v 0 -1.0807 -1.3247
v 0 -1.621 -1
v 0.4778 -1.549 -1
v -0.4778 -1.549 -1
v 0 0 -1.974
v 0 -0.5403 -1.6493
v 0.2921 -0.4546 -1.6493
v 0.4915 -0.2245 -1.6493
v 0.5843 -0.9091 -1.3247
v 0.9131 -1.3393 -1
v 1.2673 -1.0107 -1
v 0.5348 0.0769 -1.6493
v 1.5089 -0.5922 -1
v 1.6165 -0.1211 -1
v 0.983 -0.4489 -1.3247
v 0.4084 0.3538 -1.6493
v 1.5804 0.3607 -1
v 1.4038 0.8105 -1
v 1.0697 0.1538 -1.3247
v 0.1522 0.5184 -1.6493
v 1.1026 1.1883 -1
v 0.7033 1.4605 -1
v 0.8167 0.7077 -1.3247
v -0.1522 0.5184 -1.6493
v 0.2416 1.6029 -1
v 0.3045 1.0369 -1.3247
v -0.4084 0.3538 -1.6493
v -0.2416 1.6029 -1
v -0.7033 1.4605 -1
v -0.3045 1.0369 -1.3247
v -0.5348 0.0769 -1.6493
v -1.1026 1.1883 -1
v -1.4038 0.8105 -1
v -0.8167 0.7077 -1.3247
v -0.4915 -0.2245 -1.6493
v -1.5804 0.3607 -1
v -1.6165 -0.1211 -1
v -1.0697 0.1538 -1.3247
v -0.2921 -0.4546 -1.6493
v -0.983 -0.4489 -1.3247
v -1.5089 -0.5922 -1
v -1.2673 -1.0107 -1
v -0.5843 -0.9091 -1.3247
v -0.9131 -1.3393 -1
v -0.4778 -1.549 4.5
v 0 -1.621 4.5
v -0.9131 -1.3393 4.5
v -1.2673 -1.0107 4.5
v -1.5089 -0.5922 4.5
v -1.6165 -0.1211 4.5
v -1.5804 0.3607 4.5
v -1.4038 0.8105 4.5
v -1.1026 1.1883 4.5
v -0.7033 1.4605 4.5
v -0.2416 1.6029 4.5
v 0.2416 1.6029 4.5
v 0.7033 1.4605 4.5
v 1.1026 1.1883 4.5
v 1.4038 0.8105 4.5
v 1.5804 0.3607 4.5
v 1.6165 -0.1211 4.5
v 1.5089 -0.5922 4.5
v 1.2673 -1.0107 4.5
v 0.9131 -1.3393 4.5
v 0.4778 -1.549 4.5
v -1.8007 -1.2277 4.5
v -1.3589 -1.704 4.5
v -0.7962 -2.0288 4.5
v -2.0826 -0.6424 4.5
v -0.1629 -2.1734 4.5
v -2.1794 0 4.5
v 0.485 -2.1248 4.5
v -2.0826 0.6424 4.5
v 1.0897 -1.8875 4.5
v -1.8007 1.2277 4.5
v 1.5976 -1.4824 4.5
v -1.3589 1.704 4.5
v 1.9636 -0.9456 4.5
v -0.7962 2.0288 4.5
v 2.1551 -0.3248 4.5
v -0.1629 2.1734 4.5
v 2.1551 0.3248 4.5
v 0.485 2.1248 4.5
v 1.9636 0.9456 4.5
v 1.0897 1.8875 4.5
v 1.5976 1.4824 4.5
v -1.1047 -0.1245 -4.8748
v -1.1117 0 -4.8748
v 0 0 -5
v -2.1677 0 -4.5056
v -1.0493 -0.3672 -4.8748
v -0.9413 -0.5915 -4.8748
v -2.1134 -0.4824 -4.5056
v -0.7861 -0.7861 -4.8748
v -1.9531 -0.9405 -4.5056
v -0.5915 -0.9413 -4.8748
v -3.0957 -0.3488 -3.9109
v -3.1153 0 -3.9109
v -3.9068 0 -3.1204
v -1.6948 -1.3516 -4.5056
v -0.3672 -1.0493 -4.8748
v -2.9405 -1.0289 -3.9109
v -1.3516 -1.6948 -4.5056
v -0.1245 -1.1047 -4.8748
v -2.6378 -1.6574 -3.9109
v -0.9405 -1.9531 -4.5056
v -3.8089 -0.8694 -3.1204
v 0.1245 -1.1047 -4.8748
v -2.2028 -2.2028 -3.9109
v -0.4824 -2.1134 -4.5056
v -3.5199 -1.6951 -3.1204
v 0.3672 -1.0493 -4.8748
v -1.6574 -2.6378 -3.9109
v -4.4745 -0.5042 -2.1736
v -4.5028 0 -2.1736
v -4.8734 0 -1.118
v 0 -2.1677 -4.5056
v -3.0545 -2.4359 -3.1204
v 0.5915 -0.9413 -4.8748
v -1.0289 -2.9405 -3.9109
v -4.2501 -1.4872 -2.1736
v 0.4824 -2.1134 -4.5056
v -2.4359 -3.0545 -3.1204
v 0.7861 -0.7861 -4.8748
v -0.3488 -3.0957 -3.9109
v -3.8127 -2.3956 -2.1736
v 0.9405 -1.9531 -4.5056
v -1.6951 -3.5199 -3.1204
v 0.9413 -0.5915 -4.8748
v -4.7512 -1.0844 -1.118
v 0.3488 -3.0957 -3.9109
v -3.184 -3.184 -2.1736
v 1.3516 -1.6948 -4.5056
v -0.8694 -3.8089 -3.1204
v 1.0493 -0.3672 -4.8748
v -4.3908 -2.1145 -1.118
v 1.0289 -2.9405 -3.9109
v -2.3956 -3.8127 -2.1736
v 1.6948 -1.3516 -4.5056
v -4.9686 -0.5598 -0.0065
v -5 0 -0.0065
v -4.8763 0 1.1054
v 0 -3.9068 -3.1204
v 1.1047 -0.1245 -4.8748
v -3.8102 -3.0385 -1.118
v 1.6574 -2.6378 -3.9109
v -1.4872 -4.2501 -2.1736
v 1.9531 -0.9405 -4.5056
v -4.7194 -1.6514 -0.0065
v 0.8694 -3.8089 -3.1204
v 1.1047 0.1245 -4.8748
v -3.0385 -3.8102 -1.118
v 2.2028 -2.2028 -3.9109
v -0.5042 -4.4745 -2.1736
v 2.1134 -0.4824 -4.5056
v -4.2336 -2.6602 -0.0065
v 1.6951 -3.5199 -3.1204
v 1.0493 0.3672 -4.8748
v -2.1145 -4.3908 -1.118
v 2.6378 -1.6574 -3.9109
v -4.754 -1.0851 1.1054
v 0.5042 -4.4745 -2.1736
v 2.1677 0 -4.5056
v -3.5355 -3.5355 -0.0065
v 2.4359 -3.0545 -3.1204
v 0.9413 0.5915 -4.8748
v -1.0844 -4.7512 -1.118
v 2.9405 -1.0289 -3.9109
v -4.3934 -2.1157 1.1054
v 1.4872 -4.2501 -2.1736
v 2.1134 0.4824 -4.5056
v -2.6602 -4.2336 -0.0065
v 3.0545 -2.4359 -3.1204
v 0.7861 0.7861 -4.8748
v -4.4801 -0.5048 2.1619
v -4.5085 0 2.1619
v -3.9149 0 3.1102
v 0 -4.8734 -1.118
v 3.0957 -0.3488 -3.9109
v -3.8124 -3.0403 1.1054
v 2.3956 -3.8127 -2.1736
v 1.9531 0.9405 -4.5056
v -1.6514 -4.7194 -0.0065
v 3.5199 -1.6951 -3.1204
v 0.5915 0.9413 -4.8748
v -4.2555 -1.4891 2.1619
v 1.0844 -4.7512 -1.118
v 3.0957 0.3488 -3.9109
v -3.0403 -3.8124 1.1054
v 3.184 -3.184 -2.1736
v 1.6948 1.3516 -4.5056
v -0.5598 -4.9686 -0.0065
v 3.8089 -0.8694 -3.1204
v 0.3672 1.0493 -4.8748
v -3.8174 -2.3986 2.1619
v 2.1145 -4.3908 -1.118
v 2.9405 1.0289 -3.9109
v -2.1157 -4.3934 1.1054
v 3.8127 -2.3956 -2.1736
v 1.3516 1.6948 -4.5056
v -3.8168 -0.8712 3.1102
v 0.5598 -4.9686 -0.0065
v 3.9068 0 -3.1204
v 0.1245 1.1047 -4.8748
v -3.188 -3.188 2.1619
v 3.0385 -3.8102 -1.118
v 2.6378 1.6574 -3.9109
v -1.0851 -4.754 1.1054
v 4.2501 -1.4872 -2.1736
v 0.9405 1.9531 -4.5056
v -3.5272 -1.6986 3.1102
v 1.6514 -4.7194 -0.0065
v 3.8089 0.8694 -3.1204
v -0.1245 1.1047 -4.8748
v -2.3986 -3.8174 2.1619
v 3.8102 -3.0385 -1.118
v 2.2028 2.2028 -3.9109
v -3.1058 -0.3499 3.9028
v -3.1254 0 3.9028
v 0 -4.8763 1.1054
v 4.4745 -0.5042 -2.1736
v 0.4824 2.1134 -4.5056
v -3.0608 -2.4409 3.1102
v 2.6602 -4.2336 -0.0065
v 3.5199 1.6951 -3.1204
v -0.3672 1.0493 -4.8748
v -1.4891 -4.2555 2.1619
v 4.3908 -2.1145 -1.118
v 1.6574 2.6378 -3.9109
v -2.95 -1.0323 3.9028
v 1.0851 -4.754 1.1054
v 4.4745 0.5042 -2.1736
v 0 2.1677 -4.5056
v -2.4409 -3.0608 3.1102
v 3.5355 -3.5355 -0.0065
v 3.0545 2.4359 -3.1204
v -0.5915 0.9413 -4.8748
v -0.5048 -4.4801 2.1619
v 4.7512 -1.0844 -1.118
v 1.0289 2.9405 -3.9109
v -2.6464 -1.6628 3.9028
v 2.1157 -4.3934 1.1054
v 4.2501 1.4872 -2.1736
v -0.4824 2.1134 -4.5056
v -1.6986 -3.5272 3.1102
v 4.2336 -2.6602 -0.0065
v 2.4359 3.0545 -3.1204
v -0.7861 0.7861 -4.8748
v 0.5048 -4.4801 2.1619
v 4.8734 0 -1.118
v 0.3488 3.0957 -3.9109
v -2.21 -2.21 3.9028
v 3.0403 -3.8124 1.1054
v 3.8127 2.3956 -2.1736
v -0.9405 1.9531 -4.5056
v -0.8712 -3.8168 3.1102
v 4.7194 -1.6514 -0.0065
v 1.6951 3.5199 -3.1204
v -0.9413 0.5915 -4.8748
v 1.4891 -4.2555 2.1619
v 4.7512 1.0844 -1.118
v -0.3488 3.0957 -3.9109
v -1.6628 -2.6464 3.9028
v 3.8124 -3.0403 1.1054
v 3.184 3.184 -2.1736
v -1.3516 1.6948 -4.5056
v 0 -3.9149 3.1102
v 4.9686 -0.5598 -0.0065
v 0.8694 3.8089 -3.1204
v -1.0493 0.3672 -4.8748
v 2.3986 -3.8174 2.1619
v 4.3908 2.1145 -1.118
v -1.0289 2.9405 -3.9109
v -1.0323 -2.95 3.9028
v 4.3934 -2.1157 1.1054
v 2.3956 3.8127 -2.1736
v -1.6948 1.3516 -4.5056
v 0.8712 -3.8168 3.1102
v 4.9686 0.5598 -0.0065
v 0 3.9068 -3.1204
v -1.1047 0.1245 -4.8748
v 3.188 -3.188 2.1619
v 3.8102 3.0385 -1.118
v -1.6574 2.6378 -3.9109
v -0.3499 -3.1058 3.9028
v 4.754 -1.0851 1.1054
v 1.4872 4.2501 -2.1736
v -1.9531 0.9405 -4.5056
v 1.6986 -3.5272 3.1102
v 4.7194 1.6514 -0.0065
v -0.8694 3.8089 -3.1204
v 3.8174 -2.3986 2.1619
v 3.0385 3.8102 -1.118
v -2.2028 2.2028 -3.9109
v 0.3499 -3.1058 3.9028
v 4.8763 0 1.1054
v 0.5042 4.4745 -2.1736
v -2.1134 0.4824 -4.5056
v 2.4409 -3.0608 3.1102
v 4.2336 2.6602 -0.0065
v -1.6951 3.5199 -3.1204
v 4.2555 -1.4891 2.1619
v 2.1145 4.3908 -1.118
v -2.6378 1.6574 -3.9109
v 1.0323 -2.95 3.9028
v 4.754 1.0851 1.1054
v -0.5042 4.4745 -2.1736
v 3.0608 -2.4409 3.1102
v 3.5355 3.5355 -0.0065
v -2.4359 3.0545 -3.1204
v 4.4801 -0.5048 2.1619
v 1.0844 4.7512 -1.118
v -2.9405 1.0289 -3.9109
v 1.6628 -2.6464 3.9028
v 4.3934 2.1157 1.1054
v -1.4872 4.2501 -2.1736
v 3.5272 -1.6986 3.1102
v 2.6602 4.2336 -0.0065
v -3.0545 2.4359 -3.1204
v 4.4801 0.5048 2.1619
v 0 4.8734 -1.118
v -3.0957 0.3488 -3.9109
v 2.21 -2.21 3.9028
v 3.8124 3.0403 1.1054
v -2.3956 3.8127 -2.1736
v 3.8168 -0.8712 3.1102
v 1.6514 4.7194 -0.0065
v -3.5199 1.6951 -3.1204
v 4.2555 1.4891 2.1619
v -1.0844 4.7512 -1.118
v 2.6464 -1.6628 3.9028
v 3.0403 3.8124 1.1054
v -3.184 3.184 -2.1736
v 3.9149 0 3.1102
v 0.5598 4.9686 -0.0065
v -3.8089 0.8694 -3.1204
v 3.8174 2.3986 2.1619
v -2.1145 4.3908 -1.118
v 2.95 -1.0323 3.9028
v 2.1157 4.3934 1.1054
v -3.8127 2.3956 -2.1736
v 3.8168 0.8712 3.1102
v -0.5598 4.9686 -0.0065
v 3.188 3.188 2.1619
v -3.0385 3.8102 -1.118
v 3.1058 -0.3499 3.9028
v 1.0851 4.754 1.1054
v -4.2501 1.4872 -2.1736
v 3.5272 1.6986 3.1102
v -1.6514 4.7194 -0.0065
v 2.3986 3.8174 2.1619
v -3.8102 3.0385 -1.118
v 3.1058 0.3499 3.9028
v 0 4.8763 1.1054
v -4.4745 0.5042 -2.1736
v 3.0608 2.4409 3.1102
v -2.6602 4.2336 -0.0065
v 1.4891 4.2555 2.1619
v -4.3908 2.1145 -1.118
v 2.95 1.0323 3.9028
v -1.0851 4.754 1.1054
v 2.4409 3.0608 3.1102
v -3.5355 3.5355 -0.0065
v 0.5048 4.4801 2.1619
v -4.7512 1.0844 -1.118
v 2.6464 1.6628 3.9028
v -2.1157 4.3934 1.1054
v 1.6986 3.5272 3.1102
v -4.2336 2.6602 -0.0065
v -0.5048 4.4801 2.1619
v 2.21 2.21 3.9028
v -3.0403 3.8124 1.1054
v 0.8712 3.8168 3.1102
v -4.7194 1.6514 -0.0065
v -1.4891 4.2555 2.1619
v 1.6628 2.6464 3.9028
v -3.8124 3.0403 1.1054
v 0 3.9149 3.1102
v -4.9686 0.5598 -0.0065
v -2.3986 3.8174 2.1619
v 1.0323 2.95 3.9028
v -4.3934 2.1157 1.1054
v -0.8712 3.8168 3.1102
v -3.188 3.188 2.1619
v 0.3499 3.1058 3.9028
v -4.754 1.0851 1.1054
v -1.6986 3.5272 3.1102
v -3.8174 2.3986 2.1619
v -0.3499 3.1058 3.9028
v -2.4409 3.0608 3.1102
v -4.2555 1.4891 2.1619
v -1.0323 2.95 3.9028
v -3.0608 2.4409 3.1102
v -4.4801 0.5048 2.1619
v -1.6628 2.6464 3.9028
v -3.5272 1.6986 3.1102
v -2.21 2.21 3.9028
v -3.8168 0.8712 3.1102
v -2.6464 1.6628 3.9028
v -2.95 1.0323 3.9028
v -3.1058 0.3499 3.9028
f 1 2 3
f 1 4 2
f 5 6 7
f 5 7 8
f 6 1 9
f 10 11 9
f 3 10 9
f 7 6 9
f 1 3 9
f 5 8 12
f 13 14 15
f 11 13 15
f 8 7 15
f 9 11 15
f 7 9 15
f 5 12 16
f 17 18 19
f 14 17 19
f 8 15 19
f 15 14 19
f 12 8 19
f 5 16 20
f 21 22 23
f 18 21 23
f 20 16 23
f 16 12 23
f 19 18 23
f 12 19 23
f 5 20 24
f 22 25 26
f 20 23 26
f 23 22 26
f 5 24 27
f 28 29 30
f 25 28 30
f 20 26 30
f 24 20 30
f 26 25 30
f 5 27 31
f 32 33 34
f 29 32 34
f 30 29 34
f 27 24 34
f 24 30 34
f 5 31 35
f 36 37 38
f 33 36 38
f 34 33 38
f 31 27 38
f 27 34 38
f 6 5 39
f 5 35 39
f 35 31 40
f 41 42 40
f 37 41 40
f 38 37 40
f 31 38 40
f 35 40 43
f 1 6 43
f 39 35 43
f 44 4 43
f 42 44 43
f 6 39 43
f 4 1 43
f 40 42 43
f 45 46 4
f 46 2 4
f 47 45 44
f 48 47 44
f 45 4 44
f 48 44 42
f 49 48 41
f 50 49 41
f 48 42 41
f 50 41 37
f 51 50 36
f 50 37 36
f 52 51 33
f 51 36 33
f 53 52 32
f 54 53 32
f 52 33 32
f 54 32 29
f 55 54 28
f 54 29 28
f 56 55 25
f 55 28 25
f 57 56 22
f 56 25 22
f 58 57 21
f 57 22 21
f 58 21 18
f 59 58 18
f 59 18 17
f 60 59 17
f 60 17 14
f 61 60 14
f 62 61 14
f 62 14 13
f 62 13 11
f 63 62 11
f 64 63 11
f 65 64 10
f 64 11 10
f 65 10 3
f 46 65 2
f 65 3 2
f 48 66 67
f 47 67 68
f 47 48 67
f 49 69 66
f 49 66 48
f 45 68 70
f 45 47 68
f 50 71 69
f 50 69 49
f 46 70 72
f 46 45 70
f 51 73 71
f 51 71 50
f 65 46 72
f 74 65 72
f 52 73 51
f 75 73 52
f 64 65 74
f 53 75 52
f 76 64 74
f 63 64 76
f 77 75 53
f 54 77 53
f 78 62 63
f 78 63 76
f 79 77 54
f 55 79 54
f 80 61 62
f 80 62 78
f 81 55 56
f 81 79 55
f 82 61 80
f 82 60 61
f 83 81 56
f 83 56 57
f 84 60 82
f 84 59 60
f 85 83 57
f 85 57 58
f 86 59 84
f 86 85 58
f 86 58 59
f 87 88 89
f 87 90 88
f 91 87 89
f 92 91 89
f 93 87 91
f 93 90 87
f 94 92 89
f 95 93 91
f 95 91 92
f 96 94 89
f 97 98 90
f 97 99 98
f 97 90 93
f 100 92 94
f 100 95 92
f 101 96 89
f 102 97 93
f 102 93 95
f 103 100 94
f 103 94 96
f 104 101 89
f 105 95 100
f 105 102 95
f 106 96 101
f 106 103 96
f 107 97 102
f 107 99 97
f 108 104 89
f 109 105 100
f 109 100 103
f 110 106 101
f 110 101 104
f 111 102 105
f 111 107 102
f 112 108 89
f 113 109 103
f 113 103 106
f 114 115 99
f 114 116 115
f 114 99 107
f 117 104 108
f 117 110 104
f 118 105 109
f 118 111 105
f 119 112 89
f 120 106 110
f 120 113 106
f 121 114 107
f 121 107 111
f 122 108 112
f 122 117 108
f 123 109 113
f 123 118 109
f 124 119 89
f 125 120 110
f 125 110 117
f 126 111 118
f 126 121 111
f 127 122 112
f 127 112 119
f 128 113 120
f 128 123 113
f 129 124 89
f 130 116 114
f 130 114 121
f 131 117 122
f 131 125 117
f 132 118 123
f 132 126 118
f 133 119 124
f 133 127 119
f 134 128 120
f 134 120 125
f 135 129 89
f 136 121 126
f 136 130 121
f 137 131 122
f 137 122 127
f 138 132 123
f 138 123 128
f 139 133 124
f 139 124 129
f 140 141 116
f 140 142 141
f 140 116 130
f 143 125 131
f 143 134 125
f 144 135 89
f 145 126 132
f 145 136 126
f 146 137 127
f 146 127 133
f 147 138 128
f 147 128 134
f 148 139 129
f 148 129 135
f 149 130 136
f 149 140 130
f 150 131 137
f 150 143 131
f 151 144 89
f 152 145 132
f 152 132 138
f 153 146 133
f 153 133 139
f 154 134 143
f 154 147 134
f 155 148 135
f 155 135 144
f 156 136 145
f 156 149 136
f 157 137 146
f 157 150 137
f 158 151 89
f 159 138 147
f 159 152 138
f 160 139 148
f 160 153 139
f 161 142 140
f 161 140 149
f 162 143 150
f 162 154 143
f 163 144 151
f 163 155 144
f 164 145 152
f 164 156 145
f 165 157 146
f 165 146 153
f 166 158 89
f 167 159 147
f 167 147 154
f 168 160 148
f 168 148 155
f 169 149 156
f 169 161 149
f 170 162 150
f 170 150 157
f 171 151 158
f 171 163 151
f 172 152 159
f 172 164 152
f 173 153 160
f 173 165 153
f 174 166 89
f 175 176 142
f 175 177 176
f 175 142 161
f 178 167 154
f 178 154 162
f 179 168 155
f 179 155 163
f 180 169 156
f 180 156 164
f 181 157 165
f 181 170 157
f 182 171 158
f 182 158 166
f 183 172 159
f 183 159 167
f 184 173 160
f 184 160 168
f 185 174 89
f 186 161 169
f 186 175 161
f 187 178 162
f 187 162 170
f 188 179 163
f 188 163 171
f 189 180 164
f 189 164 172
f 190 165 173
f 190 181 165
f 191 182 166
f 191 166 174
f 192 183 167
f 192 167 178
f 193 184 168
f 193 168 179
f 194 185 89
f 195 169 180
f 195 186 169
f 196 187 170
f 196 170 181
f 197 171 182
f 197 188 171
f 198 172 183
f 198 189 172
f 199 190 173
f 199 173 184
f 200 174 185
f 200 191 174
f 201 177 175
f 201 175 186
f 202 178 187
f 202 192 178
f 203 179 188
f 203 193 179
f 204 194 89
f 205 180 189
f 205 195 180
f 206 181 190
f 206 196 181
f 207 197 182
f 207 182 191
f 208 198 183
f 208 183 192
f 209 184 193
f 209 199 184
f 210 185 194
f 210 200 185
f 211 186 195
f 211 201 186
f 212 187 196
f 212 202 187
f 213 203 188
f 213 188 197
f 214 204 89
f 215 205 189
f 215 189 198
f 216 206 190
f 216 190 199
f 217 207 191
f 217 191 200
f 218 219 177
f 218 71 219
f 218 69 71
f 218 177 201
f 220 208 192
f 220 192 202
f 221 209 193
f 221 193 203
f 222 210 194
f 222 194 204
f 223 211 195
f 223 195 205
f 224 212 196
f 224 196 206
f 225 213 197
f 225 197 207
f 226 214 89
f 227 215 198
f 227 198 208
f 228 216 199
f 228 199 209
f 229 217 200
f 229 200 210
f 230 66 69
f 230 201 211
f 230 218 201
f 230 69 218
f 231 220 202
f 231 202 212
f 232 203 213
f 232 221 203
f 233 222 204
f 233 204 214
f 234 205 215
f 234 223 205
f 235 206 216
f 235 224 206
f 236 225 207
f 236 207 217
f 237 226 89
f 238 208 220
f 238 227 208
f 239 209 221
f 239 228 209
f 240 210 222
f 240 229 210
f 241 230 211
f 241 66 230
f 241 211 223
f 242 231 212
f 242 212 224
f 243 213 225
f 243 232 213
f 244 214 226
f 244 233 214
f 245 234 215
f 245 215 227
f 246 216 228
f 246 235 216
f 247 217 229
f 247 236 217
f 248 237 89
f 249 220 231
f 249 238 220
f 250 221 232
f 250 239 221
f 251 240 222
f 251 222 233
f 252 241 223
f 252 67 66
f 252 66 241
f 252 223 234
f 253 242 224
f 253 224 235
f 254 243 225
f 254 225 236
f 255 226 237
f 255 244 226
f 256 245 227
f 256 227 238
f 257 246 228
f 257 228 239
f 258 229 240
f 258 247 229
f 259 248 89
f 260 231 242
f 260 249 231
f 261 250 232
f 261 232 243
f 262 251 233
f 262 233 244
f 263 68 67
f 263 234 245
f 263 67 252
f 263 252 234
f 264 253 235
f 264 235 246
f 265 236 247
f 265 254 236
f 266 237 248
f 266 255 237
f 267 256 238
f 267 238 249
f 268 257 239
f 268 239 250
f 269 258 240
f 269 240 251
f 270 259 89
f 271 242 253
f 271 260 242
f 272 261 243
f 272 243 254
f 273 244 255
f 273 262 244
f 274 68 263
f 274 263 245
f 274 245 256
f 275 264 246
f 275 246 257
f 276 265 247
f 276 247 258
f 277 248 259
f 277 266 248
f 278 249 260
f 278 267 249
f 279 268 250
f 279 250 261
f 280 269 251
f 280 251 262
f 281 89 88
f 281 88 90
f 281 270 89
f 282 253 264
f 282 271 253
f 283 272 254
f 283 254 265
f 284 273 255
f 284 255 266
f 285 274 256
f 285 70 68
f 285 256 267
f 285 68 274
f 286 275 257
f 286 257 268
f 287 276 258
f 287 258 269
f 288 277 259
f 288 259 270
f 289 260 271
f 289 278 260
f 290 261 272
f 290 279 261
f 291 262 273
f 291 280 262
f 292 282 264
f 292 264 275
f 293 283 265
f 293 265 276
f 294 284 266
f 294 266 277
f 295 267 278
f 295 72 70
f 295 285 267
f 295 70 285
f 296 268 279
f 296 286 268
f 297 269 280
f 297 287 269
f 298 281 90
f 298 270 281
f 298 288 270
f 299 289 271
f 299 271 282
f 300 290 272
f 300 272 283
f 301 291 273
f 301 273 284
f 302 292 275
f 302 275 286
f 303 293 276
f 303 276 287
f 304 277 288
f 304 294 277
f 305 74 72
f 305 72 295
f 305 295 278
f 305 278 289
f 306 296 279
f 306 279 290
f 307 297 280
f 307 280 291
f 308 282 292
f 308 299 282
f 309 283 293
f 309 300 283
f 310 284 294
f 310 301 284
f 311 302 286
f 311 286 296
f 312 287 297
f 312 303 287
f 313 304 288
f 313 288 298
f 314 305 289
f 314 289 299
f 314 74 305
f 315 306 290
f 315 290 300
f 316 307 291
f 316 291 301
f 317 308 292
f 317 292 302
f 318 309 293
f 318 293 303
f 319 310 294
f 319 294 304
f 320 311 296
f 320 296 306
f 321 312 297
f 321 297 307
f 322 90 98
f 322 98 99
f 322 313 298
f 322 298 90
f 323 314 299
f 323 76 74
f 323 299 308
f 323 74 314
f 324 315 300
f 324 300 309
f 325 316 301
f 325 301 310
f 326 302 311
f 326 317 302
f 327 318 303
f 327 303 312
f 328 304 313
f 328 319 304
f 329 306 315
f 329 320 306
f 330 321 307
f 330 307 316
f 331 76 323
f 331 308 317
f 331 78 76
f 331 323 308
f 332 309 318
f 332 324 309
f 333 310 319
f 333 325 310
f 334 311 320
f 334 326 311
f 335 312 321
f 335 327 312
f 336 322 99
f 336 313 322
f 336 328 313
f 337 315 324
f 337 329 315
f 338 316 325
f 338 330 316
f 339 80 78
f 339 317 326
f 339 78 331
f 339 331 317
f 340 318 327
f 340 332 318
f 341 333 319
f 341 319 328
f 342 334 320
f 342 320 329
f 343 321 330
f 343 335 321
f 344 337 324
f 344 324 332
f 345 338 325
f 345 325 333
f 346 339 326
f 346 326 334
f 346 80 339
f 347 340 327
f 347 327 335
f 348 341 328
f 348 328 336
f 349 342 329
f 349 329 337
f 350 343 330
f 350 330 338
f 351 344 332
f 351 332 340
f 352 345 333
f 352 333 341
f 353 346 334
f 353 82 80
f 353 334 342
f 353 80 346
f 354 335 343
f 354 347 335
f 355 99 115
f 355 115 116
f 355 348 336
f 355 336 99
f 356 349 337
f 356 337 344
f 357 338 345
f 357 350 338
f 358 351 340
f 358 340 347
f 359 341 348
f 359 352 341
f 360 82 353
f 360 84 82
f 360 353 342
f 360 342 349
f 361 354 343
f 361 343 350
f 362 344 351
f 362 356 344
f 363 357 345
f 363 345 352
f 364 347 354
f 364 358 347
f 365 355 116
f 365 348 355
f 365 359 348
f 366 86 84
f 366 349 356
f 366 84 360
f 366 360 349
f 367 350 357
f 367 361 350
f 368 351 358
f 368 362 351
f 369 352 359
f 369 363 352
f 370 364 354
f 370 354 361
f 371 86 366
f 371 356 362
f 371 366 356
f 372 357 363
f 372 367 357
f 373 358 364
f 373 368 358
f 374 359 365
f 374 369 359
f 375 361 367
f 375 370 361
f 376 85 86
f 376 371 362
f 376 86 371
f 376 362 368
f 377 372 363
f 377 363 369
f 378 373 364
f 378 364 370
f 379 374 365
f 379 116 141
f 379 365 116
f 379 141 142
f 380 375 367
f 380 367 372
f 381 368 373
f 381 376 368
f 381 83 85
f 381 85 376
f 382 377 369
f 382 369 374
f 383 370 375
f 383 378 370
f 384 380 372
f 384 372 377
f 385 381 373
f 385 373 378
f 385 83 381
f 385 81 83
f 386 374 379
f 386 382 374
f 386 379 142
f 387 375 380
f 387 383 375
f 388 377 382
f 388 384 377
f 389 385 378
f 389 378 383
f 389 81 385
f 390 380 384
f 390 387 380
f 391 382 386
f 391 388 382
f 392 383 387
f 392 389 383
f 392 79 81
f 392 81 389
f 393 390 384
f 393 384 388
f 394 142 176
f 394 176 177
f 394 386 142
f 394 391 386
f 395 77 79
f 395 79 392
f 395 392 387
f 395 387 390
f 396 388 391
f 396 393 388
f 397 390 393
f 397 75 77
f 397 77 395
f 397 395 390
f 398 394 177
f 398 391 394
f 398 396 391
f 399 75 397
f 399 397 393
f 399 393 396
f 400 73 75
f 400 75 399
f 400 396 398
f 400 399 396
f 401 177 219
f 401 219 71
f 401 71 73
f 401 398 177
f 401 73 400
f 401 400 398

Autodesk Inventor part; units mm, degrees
ref_plane "YZ Plane" through (0, 0, 0) normal (1, 0, 0) x (0, 1, 0)
ref_plane "XZ Plane" through (0, 0, 0) normal (0, 1, 0) x (-1, 0, 0)
sketch "Esquisse1" plane through (0, 0, 0) normal (0, 1, 0) x (-1, 0, 0)
  arc A0 (0, -5) -> (0, 5) centre (0, 0) ccw
  line L0 (0, 5) -> (0, -5)
  dimension "d1" = 5
revolve "Révolution1" add sketch "Esquisse1" angle 360 about axis through (0, 0, 5) along (0, 0, -1)
ref_plane "Plan de construction1" through (0, 0, 5) normal (0, 0, 1) x (1, 0, 0)
sketch "Esquisse2" plane through (0, 0, 5) normal (0, 0, 1) x (1, 0, 0)
  circle A0 centre (0, 0) radius 2.5
  dimension "d4" = 5
extrude "Extrusion1" cut sketch "Esquisse2" against normal blind 0.5
sketch "Esquisse3" plane through (0, 0, 4.5) normal (0, 0, 1) x (1, 0, 0)
  circle A0 centre (0, 0) radius 2.1794 projected
hole "Perçage1" at (0, 0, 4.5) direction (0, 0, -1) diameter 3.242 depth 5.5 tip angle 118 thread size "M4x0.7" class "6H" standard "ISO Metric profile"
properties part number "boule_serrage_main" material "Plastique ABS"
